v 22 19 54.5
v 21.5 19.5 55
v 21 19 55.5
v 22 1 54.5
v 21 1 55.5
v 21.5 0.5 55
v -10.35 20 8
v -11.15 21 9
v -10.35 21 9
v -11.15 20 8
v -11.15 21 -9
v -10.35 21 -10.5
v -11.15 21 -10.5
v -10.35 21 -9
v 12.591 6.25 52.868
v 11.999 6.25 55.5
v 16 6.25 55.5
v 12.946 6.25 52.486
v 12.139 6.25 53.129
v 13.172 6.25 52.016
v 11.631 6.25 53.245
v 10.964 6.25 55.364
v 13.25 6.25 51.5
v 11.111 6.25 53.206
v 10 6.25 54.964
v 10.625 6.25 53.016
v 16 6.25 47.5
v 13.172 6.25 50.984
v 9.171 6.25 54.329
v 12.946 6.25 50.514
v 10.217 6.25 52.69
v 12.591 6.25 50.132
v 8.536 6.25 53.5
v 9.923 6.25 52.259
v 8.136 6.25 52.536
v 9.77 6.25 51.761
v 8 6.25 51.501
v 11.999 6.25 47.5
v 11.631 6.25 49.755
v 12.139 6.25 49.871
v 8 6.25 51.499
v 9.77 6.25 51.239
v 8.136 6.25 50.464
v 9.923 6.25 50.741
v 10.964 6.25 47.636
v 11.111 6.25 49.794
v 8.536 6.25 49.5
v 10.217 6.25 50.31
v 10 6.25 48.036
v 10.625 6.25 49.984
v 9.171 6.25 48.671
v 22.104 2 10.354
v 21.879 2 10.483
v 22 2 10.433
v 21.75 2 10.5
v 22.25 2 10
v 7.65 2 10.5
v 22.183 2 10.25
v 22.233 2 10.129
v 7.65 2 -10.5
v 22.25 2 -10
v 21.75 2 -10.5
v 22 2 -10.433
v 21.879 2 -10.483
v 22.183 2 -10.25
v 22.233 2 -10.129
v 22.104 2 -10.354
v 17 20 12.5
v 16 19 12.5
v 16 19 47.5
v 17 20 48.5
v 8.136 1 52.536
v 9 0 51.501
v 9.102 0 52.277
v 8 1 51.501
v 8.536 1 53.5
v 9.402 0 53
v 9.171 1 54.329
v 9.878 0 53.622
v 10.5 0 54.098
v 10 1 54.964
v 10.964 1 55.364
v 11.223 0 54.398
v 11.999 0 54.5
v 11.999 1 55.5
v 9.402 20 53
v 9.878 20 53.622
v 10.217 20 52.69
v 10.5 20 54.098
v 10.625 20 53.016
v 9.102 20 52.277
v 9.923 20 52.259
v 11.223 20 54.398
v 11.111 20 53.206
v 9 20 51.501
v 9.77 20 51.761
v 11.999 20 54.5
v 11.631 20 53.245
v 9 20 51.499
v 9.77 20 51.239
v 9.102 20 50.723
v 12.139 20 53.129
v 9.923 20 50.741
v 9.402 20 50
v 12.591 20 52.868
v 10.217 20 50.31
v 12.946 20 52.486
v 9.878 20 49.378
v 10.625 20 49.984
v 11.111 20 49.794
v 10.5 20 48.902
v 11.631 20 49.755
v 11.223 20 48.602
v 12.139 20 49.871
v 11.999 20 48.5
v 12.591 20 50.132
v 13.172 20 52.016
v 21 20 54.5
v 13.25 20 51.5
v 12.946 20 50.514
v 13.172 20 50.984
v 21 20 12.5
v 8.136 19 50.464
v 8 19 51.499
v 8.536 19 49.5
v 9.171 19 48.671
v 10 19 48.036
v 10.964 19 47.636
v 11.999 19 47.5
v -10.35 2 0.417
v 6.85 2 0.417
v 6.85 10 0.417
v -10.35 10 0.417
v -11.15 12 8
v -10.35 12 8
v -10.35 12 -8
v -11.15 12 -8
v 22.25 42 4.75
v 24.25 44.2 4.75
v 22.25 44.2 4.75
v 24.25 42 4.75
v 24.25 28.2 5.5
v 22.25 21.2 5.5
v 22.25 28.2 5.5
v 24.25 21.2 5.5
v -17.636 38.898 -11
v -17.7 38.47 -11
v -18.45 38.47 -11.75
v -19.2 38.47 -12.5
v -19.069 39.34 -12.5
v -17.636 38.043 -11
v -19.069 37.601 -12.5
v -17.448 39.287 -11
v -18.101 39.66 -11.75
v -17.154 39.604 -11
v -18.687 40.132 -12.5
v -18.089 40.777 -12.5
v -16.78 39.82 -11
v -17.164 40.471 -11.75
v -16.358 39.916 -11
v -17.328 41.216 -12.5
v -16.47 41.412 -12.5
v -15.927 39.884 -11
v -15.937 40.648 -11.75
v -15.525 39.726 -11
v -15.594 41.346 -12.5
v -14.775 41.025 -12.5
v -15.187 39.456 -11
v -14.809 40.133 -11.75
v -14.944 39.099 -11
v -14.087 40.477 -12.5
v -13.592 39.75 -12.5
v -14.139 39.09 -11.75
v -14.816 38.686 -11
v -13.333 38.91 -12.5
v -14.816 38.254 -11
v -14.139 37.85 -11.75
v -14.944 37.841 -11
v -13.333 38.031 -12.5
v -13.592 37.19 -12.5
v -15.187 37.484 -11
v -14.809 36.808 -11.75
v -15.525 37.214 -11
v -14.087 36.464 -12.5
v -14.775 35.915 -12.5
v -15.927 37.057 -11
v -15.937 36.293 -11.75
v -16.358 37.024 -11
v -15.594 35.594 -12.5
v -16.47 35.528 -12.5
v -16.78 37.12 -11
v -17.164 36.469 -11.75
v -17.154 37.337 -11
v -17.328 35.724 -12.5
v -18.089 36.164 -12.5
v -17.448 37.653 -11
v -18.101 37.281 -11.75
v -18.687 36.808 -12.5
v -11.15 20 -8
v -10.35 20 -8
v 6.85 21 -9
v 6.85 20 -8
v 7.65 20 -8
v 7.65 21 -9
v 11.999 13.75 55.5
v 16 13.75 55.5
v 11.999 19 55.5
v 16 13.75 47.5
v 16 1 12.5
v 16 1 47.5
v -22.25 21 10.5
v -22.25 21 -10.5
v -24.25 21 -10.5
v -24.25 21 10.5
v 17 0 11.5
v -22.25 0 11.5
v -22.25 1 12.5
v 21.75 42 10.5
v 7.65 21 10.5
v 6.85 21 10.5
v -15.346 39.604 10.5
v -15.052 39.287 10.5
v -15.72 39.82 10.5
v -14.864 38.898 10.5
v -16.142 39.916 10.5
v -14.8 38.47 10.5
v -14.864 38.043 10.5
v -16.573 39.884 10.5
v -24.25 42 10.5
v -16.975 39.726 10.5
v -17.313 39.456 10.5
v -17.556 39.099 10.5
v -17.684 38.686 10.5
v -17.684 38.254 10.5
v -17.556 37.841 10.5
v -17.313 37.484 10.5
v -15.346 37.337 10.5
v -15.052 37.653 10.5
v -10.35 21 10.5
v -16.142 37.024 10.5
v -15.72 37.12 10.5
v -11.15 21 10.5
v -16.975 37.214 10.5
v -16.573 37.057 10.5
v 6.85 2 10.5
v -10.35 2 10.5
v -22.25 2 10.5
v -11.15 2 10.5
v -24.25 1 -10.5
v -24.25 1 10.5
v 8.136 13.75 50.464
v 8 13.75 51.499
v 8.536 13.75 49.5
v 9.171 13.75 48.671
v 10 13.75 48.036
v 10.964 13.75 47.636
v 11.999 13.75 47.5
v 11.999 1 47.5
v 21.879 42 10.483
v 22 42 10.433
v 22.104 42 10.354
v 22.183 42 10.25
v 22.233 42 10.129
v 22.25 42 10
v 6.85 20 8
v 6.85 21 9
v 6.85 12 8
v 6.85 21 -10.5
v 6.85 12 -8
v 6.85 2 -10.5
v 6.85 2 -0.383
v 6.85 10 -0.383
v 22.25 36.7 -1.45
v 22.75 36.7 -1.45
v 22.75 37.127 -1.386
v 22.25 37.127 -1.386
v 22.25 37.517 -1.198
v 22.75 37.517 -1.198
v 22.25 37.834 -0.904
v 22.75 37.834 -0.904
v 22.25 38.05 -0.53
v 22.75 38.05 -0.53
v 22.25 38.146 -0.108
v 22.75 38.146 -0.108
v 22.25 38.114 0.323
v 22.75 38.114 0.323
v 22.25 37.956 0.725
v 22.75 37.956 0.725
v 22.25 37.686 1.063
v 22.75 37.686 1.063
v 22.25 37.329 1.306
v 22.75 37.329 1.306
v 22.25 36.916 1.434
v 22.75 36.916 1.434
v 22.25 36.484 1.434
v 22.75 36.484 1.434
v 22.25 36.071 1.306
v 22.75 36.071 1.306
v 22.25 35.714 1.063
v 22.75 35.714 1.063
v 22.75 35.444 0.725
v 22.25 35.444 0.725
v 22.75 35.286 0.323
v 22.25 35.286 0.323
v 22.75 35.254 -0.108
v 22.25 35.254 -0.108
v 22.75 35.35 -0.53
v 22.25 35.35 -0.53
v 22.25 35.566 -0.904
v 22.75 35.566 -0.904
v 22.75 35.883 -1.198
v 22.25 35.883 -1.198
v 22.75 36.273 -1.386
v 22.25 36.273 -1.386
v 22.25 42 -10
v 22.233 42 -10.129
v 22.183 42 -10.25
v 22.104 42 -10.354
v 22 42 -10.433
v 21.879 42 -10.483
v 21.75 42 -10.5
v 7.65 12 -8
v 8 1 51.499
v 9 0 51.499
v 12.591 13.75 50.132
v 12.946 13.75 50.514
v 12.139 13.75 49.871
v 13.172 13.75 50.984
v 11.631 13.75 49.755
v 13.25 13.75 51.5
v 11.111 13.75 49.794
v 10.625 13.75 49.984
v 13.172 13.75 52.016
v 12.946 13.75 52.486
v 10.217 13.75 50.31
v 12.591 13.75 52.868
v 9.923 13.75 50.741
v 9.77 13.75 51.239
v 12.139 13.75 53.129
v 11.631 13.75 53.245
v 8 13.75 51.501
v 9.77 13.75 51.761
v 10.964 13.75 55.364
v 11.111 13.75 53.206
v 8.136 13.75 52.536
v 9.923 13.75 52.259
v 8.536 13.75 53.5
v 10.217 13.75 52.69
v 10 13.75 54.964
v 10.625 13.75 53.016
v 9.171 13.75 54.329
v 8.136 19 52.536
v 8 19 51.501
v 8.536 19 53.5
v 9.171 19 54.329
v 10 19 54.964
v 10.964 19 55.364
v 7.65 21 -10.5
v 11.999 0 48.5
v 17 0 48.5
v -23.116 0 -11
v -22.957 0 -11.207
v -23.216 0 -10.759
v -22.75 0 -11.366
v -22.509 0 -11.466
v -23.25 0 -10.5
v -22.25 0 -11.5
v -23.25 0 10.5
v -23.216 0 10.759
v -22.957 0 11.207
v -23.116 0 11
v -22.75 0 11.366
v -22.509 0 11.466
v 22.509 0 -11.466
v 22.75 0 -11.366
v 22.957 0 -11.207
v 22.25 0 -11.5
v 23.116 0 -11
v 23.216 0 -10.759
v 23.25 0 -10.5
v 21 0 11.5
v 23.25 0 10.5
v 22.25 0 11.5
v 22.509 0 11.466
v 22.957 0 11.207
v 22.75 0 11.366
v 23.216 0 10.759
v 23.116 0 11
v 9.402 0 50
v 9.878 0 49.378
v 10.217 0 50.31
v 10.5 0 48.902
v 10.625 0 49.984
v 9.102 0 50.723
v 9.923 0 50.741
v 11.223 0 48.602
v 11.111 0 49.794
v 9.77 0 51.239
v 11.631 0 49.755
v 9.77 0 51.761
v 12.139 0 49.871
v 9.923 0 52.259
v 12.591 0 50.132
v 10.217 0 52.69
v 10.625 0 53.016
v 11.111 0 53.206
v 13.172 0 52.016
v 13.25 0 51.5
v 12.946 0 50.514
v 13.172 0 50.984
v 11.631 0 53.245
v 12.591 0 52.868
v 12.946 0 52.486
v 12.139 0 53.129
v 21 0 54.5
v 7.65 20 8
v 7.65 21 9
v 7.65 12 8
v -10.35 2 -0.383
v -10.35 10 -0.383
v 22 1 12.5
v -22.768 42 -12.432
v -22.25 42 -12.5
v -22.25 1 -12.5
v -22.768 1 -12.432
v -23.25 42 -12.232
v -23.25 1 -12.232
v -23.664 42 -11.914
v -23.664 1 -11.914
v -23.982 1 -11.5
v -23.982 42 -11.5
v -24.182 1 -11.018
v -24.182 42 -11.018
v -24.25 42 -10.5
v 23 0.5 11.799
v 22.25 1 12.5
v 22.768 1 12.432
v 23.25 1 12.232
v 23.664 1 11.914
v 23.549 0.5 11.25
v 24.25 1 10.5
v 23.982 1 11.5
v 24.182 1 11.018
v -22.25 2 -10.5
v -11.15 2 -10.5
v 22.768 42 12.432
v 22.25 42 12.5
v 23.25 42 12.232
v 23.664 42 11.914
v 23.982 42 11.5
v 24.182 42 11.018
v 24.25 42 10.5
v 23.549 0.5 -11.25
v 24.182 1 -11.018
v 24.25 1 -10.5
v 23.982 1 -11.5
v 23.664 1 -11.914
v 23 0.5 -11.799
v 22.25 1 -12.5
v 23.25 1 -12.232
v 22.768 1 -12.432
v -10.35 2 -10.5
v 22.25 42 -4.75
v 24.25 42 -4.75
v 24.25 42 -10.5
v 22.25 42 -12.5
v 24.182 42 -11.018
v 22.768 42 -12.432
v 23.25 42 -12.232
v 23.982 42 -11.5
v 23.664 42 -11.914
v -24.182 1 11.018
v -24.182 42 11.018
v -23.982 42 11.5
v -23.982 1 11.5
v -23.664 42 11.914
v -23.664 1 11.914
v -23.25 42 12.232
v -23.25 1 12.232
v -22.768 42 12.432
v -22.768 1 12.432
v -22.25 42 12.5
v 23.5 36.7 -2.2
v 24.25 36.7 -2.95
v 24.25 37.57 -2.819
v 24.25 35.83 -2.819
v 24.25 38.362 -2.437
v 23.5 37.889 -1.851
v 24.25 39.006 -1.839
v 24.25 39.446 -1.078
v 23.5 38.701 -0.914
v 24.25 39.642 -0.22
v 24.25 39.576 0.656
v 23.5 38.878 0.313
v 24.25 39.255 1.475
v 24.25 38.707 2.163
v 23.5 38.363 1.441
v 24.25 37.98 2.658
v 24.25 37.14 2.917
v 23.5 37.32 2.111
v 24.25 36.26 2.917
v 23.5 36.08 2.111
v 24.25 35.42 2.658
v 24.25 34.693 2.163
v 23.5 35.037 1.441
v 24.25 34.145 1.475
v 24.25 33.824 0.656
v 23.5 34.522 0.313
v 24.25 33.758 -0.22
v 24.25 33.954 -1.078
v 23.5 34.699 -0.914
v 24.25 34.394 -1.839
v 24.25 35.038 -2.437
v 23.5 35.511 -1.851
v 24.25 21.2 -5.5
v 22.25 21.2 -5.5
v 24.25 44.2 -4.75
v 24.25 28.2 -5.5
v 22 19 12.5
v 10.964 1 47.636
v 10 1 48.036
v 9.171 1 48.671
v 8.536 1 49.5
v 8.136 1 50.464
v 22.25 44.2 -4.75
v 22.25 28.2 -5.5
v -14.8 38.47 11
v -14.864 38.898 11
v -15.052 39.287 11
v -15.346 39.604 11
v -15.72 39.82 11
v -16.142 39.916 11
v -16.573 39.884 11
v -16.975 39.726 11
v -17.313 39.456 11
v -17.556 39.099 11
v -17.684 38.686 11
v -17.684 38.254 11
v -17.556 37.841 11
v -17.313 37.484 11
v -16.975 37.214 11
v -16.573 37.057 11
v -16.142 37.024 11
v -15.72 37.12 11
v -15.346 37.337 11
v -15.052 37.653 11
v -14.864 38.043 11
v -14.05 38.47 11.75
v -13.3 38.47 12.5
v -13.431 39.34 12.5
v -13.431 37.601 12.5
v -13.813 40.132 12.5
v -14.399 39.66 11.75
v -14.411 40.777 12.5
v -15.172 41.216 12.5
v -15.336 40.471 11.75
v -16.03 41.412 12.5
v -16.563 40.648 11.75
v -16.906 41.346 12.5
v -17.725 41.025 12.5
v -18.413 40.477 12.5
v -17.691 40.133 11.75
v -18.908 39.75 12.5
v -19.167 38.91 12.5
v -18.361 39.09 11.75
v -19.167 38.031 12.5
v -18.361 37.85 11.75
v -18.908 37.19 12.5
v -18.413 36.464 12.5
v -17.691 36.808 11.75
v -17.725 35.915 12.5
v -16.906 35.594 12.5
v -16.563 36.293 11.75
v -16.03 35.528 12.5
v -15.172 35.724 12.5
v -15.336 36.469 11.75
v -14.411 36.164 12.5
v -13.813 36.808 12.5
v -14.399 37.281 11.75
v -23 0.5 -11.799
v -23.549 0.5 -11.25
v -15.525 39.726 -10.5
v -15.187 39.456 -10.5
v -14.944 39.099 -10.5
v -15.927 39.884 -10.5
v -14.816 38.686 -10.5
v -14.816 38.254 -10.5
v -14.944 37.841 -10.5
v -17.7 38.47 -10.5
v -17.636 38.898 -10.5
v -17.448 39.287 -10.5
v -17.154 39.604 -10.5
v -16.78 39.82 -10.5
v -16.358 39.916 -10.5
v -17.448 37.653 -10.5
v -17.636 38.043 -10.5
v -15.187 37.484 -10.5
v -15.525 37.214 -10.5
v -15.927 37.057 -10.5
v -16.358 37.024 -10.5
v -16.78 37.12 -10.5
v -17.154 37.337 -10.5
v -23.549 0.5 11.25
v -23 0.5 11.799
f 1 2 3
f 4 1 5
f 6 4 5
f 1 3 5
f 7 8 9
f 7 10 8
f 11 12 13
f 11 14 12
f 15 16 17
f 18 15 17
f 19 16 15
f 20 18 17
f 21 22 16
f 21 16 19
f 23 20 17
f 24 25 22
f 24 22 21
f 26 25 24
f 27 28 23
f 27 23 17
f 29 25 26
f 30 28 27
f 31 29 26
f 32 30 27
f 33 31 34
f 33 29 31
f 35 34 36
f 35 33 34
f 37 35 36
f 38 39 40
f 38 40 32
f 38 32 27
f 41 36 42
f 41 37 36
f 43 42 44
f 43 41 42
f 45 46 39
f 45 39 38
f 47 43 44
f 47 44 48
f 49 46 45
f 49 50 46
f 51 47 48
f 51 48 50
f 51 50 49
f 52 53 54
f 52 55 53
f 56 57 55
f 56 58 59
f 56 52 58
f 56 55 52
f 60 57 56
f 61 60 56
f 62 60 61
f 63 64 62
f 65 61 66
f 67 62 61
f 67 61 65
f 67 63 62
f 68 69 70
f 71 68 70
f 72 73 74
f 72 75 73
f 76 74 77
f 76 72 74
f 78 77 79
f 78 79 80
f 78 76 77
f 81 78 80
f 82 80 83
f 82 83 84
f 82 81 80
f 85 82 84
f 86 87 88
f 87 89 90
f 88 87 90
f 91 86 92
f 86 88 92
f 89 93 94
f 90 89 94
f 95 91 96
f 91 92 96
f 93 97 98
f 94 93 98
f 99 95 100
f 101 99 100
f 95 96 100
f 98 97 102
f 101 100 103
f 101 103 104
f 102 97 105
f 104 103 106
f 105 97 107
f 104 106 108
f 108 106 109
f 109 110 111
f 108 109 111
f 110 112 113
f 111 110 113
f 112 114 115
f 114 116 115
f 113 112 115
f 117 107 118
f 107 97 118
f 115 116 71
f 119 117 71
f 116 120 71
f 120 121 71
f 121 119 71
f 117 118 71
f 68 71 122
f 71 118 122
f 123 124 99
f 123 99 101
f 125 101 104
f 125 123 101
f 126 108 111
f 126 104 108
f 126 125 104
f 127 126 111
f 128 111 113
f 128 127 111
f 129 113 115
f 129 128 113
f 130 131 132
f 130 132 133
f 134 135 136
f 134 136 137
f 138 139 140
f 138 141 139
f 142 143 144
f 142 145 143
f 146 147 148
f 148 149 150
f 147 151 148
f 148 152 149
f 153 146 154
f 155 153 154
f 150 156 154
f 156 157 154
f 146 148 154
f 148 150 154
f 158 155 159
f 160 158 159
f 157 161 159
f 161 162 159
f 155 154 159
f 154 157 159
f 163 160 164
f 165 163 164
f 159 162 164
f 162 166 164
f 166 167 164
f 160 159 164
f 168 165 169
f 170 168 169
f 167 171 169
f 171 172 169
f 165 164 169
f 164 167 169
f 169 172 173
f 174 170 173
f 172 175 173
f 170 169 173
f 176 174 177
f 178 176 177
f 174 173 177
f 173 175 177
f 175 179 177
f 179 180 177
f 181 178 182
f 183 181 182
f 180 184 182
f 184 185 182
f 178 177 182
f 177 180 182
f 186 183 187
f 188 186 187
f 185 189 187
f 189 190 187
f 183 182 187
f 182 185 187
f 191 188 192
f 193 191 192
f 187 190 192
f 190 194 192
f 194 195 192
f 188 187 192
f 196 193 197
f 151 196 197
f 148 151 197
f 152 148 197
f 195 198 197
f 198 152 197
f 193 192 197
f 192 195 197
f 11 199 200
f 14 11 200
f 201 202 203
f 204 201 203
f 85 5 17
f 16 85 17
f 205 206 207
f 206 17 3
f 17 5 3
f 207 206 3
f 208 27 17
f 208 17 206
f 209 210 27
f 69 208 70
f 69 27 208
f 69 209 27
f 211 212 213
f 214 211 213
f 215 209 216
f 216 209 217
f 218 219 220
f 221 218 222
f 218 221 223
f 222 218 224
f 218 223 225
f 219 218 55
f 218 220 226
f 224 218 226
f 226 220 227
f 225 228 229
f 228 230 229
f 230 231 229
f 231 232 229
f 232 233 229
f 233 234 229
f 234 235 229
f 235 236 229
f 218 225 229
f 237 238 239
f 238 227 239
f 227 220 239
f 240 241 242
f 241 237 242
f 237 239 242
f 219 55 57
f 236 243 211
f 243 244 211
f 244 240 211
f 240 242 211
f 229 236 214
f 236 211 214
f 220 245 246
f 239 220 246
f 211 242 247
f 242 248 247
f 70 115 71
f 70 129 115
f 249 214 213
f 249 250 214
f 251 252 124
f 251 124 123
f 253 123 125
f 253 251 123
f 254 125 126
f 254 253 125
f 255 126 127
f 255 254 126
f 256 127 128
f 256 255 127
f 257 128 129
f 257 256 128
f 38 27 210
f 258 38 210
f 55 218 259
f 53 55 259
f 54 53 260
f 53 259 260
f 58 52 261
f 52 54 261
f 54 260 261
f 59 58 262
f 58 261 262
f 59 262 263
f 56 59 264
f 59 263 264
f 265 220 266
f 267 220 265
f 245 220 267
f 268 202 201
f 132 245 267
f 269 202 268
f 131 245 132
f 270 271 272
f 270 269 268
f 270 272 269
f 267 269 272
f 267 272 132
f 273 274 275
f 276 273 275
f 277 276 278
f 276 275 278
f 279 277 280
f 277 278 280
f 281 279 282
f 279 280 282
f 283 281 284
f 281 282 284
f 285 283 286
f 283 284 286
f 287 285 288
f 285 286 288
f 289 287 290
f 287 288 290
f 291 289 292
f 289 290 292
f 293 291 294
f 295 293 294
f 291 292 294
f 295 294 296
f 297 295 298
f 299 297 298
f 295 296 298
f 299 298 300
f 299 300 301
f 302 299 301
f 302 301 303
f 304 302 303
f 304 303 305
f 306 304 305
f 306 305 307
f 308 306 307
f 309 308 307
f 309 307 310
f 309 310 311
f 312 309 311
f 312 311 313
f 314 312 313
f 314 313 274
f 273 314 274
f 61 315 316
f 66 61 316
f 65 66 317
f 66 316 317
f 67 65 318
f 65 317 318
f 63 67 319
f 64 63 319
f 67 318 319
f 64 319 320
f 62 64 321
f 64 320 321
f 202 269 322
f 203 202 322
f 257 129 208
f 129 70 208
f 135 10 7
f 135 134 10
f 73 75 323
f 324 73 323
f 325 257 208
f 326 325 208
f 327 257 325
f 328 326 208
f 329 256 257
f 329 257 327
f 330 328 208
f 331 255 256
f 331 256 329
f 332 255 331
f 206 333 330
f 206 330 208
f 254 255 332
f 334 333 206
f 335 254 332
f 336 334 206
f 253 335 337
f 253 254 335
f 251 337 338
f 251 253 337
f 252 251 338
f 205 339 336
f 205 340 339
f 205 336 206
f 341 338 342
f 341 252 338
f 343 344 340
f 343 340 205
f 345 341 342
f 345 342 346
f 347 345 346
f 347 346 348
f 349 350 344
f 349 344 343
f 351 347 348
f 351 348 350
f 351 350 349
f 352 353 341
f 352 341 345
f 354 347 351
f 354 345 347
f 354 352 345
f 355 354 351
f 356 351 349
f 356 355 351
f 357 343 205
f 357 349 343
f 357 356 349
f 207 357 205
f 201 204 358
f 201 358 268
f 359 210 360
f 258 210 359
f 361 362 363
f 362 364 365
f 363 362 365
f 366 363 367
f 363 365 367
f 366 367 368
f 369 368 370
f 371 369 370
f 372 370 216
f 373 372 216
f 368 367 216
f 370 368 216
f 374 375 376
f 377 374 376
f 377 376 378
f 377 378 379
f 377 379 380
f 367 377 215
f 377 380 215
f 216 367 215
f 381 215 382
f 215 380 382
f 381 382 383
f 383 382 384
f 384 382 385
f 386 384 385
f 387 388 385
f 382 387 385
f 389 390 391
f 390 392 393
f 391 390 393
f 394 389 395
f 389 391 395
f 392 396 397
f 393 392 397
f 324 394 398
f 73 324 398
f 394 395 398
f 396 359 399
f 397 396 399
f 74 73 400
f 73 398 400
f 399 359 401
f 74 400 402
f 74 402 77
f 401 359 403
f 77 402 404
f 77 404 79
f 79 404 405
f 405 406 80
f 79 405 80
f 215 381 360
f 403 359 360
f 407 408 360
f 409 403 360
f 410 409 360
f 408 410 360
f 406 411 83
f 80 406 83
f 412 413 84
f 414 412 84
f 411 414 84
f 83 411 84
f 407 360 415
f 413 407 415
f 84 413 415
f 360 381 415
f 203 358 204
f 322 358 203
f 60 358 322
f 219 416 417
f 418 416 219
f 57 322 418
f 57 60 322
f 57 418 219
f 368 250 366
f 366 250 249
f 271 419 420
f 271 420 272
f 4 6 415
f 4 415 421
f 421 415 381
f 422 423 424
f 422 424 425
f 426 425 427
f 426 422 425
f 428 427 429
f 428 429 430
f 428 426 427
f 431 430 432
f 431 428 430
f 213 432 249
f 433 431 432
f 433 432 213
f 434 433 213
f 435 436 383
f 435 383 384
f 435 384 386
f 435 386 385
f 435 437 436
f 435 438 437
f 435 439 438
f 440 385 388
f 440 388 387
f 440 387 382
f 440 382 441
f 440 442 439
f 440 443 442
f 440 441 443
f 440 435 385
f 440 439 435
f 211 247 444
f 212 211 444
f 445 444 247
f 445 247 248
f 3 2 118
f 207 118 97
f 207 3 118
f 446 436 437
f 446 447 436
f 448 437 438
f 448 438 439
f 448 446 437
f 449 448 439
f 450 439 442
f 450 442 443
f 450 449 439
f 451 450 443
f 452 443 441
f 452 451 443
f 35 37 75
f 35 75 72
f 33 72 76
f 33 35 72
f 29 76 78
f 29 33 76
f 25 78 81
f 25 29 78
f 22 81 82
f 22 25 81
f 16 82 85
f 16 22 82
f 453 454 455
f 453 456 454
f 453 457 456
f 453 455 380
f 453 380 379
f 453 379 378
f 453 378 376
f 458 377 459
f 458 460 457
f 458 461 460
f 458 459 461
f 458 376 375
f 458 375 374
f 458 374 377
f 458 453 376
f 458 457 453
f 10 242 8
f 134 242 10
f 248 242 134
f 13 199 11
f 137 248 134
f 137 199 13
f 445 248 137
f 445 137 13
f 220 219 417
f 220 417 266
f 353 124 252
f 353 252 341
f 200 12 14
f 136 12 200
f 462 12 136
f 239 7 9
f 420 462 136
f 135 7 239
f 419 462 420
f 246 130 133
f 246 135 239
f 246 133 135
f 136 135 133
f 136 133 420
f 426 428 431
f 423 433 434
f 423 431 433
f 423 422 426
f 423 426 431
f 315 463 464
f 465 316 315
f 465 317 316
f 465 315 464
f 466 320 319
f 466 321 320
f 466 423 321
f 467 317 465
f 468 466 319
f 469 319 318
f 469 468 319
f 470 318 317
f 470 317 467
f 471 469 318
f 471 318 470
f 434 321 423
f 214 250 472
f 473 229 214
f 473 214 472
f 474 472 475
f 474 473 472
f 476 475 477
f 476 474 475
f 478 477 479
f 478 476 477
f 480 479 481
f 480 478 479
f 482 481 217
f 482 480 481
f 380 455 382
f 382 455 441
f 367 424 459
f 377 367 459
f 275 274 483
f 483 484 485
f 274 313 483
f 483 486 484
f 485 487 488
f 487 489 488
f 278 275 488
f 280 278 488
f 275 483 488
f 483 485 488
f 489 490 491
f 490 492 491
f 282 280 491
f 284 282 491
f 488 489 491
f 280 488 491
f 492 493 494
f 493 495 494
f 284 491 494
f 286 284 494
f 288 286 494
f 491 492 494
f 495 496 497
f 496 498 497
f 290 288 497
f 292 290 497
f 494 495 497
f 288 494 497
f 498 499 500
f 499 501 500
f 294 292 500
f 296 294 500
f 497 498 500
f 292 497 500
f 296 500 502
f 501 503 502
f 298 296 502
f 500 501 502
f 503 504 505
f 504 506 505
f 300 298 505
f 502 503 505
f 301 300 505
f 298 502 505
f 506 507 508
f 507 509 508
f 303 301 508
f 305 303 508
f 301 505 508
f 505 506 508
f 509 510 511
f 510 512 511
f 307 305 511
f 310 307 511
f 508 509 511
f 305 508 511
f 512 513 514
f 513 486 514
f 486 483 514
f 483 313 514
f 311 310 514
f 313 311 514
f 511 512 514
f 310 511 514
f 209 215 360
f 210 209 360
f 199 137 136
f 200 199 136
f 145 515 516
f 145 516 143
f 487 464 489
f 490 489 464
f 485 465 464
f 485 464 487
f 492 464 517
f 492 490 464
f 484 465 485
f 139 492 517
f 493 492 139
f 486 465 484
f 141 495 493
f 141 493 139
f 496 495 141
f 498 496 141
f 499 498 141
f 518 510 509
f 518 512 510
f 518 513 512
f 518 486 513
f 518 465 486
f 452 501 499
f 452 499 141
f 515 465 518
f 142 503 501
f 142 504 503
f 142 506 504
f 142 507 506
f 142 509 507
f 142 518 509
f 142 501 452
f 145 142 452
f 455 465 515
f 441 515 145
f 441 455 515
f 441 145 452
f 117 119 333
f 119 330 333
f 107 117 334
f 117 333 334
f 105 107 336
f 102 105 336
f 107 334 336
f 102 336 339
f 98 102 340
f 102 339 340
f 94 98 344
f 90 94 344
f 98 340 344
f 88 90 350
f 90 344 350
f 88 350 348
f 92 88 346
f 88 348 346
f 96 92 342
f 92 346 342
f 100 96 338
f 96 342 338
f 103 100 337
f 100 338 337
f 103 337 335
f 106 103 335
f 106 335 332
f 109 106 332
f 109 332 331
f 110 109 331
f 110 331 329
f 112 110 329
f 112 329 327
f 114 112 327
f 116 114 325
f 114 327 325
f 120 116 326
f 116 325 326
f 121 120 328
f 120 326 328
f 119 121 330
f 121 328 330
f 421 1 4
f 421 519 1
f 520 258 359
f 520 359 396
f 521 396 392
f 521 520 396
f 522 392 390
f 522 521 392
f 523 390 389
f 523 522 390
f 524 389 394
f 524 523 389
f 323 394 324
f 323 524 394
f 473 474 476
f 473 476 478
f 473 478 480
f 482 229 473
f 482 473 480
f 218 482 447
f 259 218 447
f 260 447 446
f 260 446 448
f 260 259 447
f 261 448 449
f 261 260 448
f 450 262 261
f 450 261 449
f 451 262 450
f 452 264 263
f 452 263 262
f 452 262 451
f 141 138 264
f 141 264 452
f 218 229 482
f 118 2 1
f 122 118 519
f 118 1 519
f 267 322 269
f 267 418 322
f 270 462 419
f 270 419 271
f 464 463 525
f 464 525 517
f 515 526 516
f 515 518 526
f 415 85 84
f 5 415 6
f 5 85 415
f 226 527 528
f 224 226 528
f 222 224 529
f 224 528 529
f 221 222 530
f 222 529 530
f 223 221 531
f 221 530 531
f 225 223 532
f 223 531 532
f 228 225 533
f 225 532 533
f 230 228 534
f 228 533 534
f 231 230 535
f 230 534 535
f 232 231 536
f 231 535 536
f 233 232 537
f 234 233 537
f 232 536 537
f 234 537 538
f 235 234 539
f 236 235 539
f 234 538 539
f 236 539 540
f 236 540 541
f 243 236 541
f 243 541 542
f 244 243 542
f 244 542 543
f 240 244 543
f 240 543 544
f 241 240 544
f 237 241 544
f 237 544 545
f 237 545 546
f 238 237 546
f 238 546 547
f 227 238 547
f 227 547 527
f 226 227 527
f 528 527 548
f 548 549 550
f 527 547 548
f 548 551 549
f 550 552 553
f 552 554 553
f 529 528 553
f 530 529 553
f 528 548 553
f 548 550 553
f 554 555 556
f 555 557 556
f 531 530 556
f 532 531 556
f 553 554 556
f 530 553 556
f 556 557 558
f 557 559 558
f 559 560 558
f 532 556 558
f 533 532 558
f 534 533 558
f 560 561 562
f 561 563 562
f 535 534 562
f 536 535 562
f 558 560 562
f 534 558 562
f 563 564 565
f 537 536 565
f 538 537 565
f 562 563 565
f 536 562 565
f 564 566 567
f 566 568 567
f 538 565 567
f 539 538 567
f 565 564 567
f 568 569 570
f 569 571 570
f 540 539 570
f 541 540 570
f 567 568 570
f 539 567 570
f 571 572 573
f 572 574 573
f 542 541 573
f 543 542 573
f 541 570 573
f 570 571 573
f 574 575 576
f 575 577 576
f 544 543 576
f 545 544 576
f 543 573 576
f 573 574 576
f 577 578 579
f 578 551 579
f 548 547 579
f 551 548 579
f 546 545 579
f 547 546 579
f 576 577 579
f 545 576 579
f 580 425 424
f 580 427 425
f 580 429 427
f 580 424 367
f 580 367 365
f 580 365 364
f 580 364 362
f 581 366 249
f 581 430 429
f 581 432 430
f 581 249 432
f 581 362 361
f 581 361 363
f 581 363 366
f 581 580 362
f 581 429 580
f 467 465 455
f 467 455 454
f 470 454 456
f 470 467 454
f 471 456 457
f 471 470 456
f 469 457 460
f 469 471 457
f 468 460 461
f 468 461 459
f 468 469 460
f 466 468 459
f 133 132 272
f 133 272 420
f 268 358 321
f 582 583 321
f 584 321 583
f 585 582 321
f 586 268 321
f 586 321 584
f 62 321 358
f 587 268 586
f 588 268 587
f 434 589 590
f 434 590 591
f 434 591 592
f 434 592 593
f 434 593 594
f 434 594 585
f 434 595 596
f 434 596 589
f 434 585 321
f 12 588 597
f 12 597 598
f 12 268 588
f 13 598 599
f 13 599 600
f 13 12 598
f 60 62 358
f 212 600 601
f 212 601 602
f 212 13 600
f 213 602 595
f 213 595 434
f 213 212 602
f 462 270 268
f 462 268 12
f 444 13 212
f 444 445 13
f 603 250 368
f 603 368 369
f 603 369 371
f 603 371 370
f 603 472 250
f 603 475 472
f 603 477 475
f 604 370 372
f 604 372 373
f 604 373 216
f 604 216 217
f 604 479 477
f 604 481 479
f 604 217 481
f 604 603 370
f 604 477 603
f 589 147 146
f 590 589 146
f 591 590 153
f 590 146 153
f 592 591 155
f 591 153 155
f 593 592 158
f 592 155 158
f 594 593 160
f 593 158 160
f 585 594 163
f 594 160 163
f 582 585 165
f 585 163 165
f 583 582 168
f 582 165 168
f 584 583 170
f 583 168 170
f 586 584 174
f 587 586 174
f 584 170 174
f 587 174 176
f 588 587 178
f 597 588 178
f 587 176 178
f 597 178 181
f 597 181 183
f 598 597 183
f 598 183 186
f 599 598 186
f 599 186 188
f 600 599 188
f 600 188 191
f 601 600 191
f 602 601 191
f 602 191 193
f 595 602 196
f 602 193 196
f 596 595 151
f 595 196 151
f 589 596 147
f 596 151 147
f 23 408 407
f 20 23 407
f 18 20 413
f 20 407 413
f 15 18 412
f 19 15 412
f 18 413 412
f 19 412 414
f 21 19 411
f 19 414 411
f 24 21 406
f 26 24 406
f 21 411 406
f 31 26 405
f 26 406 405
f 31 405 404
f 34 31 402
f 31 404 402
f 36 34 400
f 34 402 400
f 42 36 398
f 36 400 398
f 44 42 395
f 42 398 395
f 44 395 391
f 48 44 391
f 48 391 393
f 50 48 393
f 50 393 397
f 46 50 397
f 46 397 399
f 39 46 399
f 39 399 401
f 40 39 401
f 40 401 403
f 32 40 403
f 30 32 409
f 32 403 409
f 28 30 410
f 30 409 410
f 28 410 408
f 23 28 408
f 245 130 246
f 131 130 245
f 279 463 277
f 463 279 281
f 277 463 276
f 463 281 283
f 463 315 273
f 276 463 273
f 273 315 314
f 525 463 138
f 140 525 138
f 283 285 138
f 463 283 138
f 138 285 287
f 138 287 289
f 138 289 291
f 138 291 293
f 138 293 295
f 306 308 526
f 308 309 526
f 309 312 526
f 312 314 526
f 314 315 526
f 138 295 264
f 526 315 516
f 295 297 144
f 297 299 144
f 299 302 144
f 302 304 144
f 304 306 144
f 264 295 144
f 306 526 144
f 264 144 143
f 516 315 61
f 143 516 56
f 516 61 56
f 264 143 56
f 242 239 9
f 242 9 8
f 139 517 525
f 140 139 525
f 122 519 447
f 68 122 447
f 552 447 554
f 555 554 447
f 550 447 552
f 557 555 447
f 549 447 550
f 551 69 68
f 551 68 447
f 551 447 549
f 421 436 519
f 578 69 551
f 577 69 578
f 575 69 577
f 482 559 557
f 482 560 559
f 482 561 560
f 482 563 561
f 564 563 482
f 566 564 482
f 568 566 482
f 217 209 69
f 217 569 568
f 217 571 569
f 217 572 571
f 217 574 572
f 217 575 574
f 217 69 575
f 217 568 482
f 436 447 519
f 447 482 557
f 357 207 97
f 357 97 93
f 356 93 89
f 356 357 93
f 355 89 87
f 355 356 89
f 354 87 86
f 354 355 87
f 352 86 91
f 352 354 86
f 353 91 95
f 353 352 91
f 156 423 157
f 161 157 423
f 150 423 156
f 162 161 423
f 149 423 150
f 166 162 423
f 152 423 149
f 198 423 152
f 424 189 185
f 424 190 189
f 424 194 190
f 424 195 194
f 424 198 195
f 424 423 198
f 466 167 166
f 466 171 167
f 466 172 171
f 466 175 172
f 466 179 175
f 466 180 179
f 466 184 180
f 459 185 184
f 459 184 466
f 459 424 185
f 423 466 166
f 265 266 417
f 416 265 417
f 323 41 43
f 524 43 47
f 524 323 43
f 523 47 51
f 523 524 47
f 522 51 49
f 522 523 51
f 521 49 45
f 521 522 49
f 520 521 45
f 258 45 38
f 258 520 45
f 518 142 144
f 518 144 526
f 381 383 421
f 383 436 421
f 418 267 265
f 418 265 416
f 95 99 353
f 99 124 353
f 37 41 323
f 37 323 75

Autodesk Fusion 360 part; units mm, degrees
sketch "Skizze1" plane through (0, 0, 0) normal (0, 1, 0) x (1, 0, 0)
  line L0 (-24.25, 12.5) -> (24.25, 12.5)
  line L1 (24.25, 12.5) -> (24.25, -12.5)
  line L2 (24.25, -12.5) -> (-24.25, -12.5)
  line L3 (-24.25, -12.5) -> (-24.25, 12.5)
  line L4 (-24.25, 12.5) -> (24.25, -12.5) construction
  line L5 (24.25, 12.5) -> (-24.25, -12.5) construction
  line L6 (22.25, -10.5) -> (-22.25, -10.5)
  line L7 (-22.25, -10.5) -> (-22.25, 10.5)
  line L8 (-22.25, 10.5) -> (22.25, 10.5)
  line L9 (22.25, 10.5) -> (22.25, -10.5)
  line L10 (-22.25, -10.5) -> (-24.25, -10.5)
  line L11 (-22.25, 10.5) -> (-24.25, 10.5)
  dimension "d1" = 48.5
  dimension "d2" = 25
  dimension "d3" = 2
extrude "Extrusion1" add sketch "Skizze1" along normal blind 2 contours L6 L7 L8 L9
extrude "Extrusion3" add sketch "Skizze1" along normal blind 42 contours L0 L1 L2 L3 L6 L8 L9 L10 L11
sketch "Skizze2" plane through (0, 0, 12.5) normal (0, 0, 1) x (1, 0, 0)
  line L0 (-24.25, 0) -> (24.25, 0)
  line L1 (24.25, 0) -> (24.25, 42)
  line L2 (24.25, 42) -> (-24.25, 42)
  line L3 (-24.25, 42) -> (-24.25, 0)
  circle A0 centre (-16.25, 38.4702) radius 1.45
  dimension "d11" = 2.9
sketch "Skizze3" plane through (0, 0, -12.5) normal (0, 0, -1) x (-1, 0, 0)
  line L0 (-24.25, 0) -> (24.25, 0)
  line L1 (24.25, 0) -> (24.25, 42)
  line L2 (24.25, 42) -> (-24.25, 42)
  line L3 (-24.25, 42) -> (-24.25, 0)
  circle A0 centre (16.25, 38.4702) radius 1.45
  dimension "d12" = 2.9
extrude "Extrusion4" cut sketch "Skizze3" against normal blind 2 contours A0
extrude "Extrusion5" cut sketch "Skizze2" against normal blind 2 contours A0
chamfer "Fase1" distance 1.5 angle 45 1 edges at (-17.6019, 38.9946, 12.5)
chamfer "Fase2" distance 1.5 angle 45 1 edges at (-14.8981, 38.9946, -12.5)
sketch "Skizze4" plane through (0, 42, 0) normal (0, 1, 0) x (-1, 0, 0)
  line L0 (-22.25, -10.5) -> (-22.25, 10.5)
  line L1 (-22.25, 10.5) -> (24.25, 10.5)
  line L2 (24.25, 10.5) -> (24.25, 12.5)
  line L3 (24.25, 12.5) -> (-24.25, 12.5)
  line L4 (-24.25, 12.5) -> (-24.25, -12.5)
  line L5 (-24.25, -12.5) -> (24.25, -12.5)
  line L6 (24.25, -12.5) -> (24.25, -10.5)
  line L7 (24.25, -10.5) -> (-22.25, -10.5)
  line L8 (-22.25, -4.75) -> (-24.25, -4.75)
  line L9 (-24.25, -4.75) -> (-24.25, 4.75)
  line L10 (-24.25, 4.75) -> (-22.25, 4.75)
  line L11 (-22.25, 4.75) -> (-22.25, -4.75)
  line L12 (-22.25, -4.75) -> (-24.25, 4.75) construction
  line L13 (-24.25, -4.75) -> (-22.25, 4.75) construction
  point P0 (-23.25, 0)
  dimension "d20" = 2
  dimension "d21" = 9.5
extrude "Extrusion6" add sketch "Skizze4" along normal blind 2.2 contours L0 L4 L8 L9 L10 L11
sketch "Skizze5" plane through (24.25, 0, 0) normal (1, 0, 0) x (0, 0, -1)
  line L0 (-12.5, 0) -> (12.5, 0)
  line L1 (12.5, 0) -> (12.5, 42)
  line L2 (12.5, 42) -> (4.75, 42)
  line L3 (4.75, 42) -> (4.75, 44.2)
  line L4 (4.75, 44.2) -> (-4.75, 44.2)
  line L5 (-4.75, 44.2) -> (-4.75, 42)
  line L6 (-4.75, 42) -> (-12.5, 42)
  line L7 (-12.5, 42) -> (-12.5, 0)
  circle A0 centre (0, 36.7) radius 1.45
  line L8 (5.5, 21.2) -> (-5.5, 21.2)
  line L9 (-5.5, 21.2) -> (-5.5, 28.2)
  line L10 (-5.5, 28.2) -> (5.5, 28.2)
  line L11 (5.5, 28.2) -> (5.5, 21.2)
  line L12 (5.5, 21.2) -> (-5.5, 28.2) construction
  line L13 (-5.5, 21.2) -> (5.5, 28.2) construction
  point P0 (0, 24.7)
  dimension "d25" = 2.9
  dimension "d27" = 11
  dimension "d28" = 7
extrude "Extrusion7" cut sketch "Skizze5" against normal blind 2 contours A0 | L8 L9 L10 L11
chamfer "Fase3" distance 1.5 angle 45 1 edges at (24.25, 37.2243, 1.3519)
extrude "Extrusion8" add sketch "Skizze1" along normal blind 2 contours L3 L7 L10 L11
sketch "Skizze6" plane through (0, 2, 0) normal (0, 1, 0) x (-1, 0, 0)
  line L0 (-22.25, -10.5) -> (24.25, -10.5)
  line L1 (24.25, -10.5) -> (24.25, 10.5)
  line L2 (24.25, 10.5) -> (-22.25, 10.5)
  line L3 (-22.25, 10.5) -> (-22.25, -10.5)
  line L4 (11.15, -10.5) -> (10.35, -10.5)
  line L5 (10.35, -10.5) -> (10.35, 10.5)
  line L6 (10.35, 10.5) -> (11.15, 10.5)
  line L7 (11.15, 10.5) -> (11.15, -10.5)
  line L8 (11.15, -10.5) -> (10.35, 10.5) construction
  line L9 (10.35, -10.5) -> (11.15, 10.5) construction
  line L10 (-6.85, -10.5) -> (-7.65, -10.5)
  line L11 (-7.65, -10.5) -> (-7.65, 10.5)
  line L12 (-7.65, 10.5) -> (-6.85, 10.5)
  line L13 (-6.85, 10.5) -> (-6.85, -10.5)
  line L14 (-6.85, -10.5) -> (-7.65, 10.5) construction
  line L15 (-7.65, -10.5) -> (-6.85, 10.5) construction
  line L16 (-7.65, 10.5) -> (-6.85, 10.5)
  line L17 (-6.85, 10.5) -> (-6.85, 8)
  line L18 (-6.85, 8) -> (-7.65, 8)
  line L19 (-7.65, 8) -> (-7.65, 10.5)
  line L20 (10.35, 10.5) -> (11.15, 10.5)
  line L21 (11.15, 10.5) -> (11.15, 8)
  line L22 (11.15, 8) -> (10.35, 8)
  line L23 (10.35, 8) -> (10.35, 10.5)
  line L24 (-7.65, -10.5) -> (-6.85, -10.5)
  line L25 (-6.85, -10.5) -> (-6.85, -8)
  line L26 (-6.85, -8) -> (-7.65, -8)
  line L27 (-7.65, -8) -> (-7.65, -10.5)
  line L28 (10.35, -10.5) -> (11.15, -10.5)
  line L29 (11.15, -10.5) -> (11.15, -8)
  line L30 (11.15, -8) -> (10.35, -8)
  line L31 (10.35, -8) -> (10.35, -10.5)
  line L32 (-6.85, 0.4172) -> (10.35, 0.4172)
  line L33 (10.35, 0.4172) -> (10.35, -0.3828)
  line L34 (10.35, -0.3828) -> (-6.85, -0.3828)
  line L35 (-6.85, -0.3828) -> (-6.85, 0.4172)
  line L36 (24.25, 10.5) -> (22.25, 10.5)
  line L37 (22.25, 10.5) -> (22.25, -10.5)
  line L38 (22.25, -10.5) -> (24.25, -10.5)
  line L39 (24.25, -10.5) -> (24.25, 10.5)
  point P0 (10.75, 0)
  point P1 (-7.25, 0)
  dimension "d35" = 18
  dimension "d36" = 0.8
  dimension "d37" = 21
  dimension "d38" = 0.8
  dimension "d39" = 21
  dimension "d40" = 0.8
  dimension "d41" = 2.5
  dimension "d42" = 2.5
  dimension "d43" = 2.5
  dimension "d44" = 2.5
  dimension "d49" = 0.8
  dimension "d50" = 2
extrude "Extrusion9" add sketch "Skizze6" along normal blind 10 contours L11 L13 L18 L26 L35 | L5 L7 L22 L30 L33
extrude "Extrusion10" add sketch "Skizze6" along normal blind 19 contours L0 L10 L11 L13 L24 L25 L26 L27 | L2 L11 L12 L13 L16 L17 L18 L19 | L0 L4 L5 L7 L28 L29 L30 L31 | L2 L5 L6 L7 L20 L21 L22 L23
extrude "Extrusion12" add sketch "Skizze6" along normal blind 19 contours L0 L1 L2 L36 L37 L38 L39
extrude "Extrusion13" add sketch "Skizze6" along normal blind 8 contours L5 L13 L32 L33 L34 L35
chamfer "Fase4" distance 1 angle 45 4 edges at (-10.75, 21, 8) (7.25, 21, 8) (-10.75, 21, -8) (7.25, 21, -8)
fillet "Abrundung1" radius 2 2 edges at (24.25, 21, -12.5) (24.25, 21, 12.5)
fillet "Abrundung2" radius 0.5 2 edges at (22.25, 22, 10.5) (22.25, 22, -10.5)
fillet "Abrundung3" radius 2 2 edges at (-24.25, 21, 12.5) (-24.25, 21, -12.5)
sketch "Skizze8" plane through (0, 0, 12.5) normal (0, 0, 1) x (1, 0, 0)
  line L0 (-22.25, 42) -> (-22.25, 0)
  line L1 (-22.25, 0) -> (22.25, 0)
  line L2 (22.25, 0) -> (22.25, 42)
  line L3 (22.25, 42) -> (-22.25, 42)
  circle A0 centre (-16.25, 38.4702) radius 2.95
  line L4 (22, 0) -> (16, 0)
  line L5 (16, 0) -> (16, 20)
  line L6 (16, 20) -> (22, 20)
  line L7 (22, 20) -> (22, 0)
  line L8 (22, 0) -> (16, 20) construction
  line L9 (16, 0) -> (22, 20) construction
  point P0 (19, 10)
  dimension "d68" = 6
  dimension "d69" = 20
extrude "Extrusion15" add sketch "Skizze8" along normal blind 43 contours L1 L4 L5 L6 L7
sketch "Skizze9" plane through (16, 0, 0) normal (-1, 0, 0) x (0, 0, 1)
  line L0 (12.5, 20) -> (12.5, 0)
  line L1 (12.5, 0) -> (55.5, 0)
  line L2 (55.5, 0) -> (55.5, 20)
  line L3 (55.5, 20) -> (12.5, 20)
  line L4 (55.5, 20) -> (47.5, 20)
  line L5 (47.5, 20) -> (47.5, 0)
  line L6 (47.5, 0) -> (55.5, 0)
  line L7 (55.5, 0) -> (55.5, 20)
  dimension "d72" = 8
extrude "Extrusion16" add sketch "Skizze9" along normal blind 8 contours L1 L2 L3 L4 L5 L6 L7
sketch "Skizze10" plane through (0, 0, 0) normal (0, -1, 0) x (1, 0, 0)
  line L0 (8, 47.5) -> (16, 47.5)
  line L1 (16, 47.5) -> (16, 12.5)
  line L2 (22.25, 12.5) -> (22, 12.5)
  arc A0 (-22.25, 12.5) -> (-24.25, 10.5) centre (-22.25, 10.5) ccw
  line L3 (-24.25, 10.5) -> (-24.25, -10.5)
  arc A1 (-24.25, -10.5) -> (-22.25, -12.5) centre (-22.25, -10.5) ccw
  line L4 (-22.25, -12.5) -> (22.25, -12.5)
  arc A2 (22.25, -12.5) -> (24.25, -10.5) centre (22.25, -10.5) ccw
  line L5 (24.25, -10.5) -> (24.25, 10.5)
  arc A3 (24.25, 10.5) -> (22.25, 12.5) centre (22.25, 10.5) ccw
  line L6 (22, 12.5) -> (22, 55.5)
  line L7 (22, 55.5) -> (8, 55.5)
  circle A4 centre (11.5, 51.5) radius 1.75
  line L8 (8, 55.5) -> (8, 47.5)
  line L9 (16, 12.5) -> (-22.25, 12.5)
  dimension "d77" = 3.5
extrude "Extrusion17" cut sketch "Skizze10" against normal blind 20 contours A4
sketch "Skizze11" plane through (8, 0, 0) normal (-1, 0, 0) x (0, 0, 1)
  line L0 (55.5, 0) -> (55.5, 20)
  line L1 (55.5, 20) -> (47.5, 20)
  line L2 (47.5, 20) -> (47.5, 0)
  line L3 (47.5, 0) -> (55.5, 0)
  line L4 (55.5, 6.25) -> (47.5, 6.25)
  line L5 (47.5, 6.25) -> (47.5, 13.75)
  line L6 (47.5, 13.75) -> (55.5, 13.75)
  line L7 (55.5, 13.75) -> (55.5, 6.25)
  line L8 (55.5, 6.25) -> (47.5, 13.75) construction
  line L9 (47.5, 6.25) -> (55.5, 13.75) construction
  point P0 (51.5, 10)
  dimension "d80" = 7.5
extrude "Extrusion18" cut sketch "Skizze11" against normal blind 8 contours L0 L2 L4 L5 L6 L7
fillet "Abrundung5" radius 4 4 edges at (8, 16.875, 47.5) (8, 16.875, 55.5) (8, 3.125, 47.5) (8, 3.125, 55.5)
chamfer "Fase10" distance 1 angle 45 19 edges at (14, 0, 47.5) (8, 0, 51.5) (17, 0, 55.5) (22, 0, 34) (23.6642, 0, 11.9142) (24.25, 0, 0) (23.6642, 0, -11.9142) (0, 0, -12.5) (-23.6642, 0, -11.9142) (-24.25, 0, 0) (-23.6642, 0, 11.9142) (-3.125, 0, 12.5) (22.125, 0, 12.5) (16, 0, 30) (22, 20, 34) (17, 20, 55.5) (8, 20, 51.5) (14, 20, 47.5) (16, 20, 30)
chamfer "Fase11" distance 1 angle 45 1 edges at (22, 10, 55.5)
